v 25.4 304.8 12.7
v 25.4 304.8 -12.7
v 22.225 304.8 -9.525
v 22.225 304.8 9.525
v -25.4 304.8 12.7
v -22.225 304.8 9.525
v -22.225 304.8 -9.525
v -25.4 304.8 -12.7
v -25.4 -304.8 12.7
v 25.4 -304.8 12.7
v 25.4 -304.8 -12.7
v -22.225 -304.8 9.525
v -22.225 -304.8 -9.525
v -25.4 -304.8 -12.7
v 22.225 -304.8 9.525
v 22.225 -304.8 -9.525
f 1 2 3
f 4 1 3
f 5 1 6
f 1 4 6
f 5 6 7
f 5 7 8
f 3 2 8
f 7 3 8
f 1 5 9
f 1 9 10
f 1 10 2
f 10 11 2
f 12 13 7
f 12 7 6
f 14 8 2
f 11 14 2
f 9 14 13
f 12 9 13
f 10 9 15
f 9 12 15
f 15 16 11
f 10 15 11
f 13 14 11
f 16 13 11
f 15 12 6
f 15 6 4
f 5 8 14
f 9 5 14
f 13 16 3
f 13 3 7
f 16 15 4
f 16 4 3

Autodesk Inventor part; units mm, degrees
ref_plane "YZ Plane" through (0, 0, 0) normal (1, 0, 0) x (0, 1, 0)
ref_plane "XZ Plane" through (0, 0, 0) normal (0, 1, 0) x (-1, 0, 0)
ref_plane "XY Plane" through (0, 0, 0) normal (0, 0, 1) x (1, 0, 0)
sketch "Sketch1" plane through (0, 0, 0) normal (0, 0, 1) x (1, 0, 0)
  line L0 (-25.4, -304.8) -> (25.4, -304.8)
  line L1 (25.4, -304.8) -> (25.4, 304.8)
  line L2 (25.4, 304.8) -> (-25.4, 304.8)
  line L3 (-25.4, 304.8) -> (-25.4, -304.8)
  line L4 (-25.4, -304.8) -> (25.4, 304.8) construction
  line L5 (25.4, -304.8) -> (-25.4, 304.8) construction
  point P0 (0, 0)
  dimension "d0" = 50.8
  dimension "d1" = 609.6
extrude "Extrusion1" add sketch "Sketch1" along normal mid plane 25.4
sketch "Sketch2" plane through (0, 0, 0) normal (0, 1, 0) x (-1, 0, 0)
  line L0 (-22.225, 9.525) -> (-22.225, -9.525)
  line L1 (-22.225, -9.525) -> (22.225, -9.525)
  line L2 (22.225, -9.525) -> (22.225, 9.525)
  line L3 (22.225, 9.525) -> (-22.225, 9.525)
  line L4 (-22.225, 9.525) -> (22.225, -9.525) construction
  line L5 (-22.225, -9.525) -> (22.225, 9.525) construction
  line L6 (25.4, -12.7) -> (25.4, 12.7) projected
  line L7 (25.4, 12.7) -> (-25.4, 12.7) projected
  point P0 (0, 0)
  dimension "d4" = 3.175
  dimension "d5" = 3.175
extrude "Extrusion2" cut sketch "Sketch2" along normal through all both and the other way through all
equation "\"d0\" = width"
equation "\"d1\" = height"
equation "\"d2\" = depth"
equation "\"d4\" = wallThickness"
equation "\"d5\" = wallThickness"
equation "\"depth\" = 25.4"
equation "\"width\" = 50.8"
equation "\"height\" = 609.6"
equation "\"wallThickness\" = 3.175"
properties part number "1x2x24inAluminumExtrusion"
